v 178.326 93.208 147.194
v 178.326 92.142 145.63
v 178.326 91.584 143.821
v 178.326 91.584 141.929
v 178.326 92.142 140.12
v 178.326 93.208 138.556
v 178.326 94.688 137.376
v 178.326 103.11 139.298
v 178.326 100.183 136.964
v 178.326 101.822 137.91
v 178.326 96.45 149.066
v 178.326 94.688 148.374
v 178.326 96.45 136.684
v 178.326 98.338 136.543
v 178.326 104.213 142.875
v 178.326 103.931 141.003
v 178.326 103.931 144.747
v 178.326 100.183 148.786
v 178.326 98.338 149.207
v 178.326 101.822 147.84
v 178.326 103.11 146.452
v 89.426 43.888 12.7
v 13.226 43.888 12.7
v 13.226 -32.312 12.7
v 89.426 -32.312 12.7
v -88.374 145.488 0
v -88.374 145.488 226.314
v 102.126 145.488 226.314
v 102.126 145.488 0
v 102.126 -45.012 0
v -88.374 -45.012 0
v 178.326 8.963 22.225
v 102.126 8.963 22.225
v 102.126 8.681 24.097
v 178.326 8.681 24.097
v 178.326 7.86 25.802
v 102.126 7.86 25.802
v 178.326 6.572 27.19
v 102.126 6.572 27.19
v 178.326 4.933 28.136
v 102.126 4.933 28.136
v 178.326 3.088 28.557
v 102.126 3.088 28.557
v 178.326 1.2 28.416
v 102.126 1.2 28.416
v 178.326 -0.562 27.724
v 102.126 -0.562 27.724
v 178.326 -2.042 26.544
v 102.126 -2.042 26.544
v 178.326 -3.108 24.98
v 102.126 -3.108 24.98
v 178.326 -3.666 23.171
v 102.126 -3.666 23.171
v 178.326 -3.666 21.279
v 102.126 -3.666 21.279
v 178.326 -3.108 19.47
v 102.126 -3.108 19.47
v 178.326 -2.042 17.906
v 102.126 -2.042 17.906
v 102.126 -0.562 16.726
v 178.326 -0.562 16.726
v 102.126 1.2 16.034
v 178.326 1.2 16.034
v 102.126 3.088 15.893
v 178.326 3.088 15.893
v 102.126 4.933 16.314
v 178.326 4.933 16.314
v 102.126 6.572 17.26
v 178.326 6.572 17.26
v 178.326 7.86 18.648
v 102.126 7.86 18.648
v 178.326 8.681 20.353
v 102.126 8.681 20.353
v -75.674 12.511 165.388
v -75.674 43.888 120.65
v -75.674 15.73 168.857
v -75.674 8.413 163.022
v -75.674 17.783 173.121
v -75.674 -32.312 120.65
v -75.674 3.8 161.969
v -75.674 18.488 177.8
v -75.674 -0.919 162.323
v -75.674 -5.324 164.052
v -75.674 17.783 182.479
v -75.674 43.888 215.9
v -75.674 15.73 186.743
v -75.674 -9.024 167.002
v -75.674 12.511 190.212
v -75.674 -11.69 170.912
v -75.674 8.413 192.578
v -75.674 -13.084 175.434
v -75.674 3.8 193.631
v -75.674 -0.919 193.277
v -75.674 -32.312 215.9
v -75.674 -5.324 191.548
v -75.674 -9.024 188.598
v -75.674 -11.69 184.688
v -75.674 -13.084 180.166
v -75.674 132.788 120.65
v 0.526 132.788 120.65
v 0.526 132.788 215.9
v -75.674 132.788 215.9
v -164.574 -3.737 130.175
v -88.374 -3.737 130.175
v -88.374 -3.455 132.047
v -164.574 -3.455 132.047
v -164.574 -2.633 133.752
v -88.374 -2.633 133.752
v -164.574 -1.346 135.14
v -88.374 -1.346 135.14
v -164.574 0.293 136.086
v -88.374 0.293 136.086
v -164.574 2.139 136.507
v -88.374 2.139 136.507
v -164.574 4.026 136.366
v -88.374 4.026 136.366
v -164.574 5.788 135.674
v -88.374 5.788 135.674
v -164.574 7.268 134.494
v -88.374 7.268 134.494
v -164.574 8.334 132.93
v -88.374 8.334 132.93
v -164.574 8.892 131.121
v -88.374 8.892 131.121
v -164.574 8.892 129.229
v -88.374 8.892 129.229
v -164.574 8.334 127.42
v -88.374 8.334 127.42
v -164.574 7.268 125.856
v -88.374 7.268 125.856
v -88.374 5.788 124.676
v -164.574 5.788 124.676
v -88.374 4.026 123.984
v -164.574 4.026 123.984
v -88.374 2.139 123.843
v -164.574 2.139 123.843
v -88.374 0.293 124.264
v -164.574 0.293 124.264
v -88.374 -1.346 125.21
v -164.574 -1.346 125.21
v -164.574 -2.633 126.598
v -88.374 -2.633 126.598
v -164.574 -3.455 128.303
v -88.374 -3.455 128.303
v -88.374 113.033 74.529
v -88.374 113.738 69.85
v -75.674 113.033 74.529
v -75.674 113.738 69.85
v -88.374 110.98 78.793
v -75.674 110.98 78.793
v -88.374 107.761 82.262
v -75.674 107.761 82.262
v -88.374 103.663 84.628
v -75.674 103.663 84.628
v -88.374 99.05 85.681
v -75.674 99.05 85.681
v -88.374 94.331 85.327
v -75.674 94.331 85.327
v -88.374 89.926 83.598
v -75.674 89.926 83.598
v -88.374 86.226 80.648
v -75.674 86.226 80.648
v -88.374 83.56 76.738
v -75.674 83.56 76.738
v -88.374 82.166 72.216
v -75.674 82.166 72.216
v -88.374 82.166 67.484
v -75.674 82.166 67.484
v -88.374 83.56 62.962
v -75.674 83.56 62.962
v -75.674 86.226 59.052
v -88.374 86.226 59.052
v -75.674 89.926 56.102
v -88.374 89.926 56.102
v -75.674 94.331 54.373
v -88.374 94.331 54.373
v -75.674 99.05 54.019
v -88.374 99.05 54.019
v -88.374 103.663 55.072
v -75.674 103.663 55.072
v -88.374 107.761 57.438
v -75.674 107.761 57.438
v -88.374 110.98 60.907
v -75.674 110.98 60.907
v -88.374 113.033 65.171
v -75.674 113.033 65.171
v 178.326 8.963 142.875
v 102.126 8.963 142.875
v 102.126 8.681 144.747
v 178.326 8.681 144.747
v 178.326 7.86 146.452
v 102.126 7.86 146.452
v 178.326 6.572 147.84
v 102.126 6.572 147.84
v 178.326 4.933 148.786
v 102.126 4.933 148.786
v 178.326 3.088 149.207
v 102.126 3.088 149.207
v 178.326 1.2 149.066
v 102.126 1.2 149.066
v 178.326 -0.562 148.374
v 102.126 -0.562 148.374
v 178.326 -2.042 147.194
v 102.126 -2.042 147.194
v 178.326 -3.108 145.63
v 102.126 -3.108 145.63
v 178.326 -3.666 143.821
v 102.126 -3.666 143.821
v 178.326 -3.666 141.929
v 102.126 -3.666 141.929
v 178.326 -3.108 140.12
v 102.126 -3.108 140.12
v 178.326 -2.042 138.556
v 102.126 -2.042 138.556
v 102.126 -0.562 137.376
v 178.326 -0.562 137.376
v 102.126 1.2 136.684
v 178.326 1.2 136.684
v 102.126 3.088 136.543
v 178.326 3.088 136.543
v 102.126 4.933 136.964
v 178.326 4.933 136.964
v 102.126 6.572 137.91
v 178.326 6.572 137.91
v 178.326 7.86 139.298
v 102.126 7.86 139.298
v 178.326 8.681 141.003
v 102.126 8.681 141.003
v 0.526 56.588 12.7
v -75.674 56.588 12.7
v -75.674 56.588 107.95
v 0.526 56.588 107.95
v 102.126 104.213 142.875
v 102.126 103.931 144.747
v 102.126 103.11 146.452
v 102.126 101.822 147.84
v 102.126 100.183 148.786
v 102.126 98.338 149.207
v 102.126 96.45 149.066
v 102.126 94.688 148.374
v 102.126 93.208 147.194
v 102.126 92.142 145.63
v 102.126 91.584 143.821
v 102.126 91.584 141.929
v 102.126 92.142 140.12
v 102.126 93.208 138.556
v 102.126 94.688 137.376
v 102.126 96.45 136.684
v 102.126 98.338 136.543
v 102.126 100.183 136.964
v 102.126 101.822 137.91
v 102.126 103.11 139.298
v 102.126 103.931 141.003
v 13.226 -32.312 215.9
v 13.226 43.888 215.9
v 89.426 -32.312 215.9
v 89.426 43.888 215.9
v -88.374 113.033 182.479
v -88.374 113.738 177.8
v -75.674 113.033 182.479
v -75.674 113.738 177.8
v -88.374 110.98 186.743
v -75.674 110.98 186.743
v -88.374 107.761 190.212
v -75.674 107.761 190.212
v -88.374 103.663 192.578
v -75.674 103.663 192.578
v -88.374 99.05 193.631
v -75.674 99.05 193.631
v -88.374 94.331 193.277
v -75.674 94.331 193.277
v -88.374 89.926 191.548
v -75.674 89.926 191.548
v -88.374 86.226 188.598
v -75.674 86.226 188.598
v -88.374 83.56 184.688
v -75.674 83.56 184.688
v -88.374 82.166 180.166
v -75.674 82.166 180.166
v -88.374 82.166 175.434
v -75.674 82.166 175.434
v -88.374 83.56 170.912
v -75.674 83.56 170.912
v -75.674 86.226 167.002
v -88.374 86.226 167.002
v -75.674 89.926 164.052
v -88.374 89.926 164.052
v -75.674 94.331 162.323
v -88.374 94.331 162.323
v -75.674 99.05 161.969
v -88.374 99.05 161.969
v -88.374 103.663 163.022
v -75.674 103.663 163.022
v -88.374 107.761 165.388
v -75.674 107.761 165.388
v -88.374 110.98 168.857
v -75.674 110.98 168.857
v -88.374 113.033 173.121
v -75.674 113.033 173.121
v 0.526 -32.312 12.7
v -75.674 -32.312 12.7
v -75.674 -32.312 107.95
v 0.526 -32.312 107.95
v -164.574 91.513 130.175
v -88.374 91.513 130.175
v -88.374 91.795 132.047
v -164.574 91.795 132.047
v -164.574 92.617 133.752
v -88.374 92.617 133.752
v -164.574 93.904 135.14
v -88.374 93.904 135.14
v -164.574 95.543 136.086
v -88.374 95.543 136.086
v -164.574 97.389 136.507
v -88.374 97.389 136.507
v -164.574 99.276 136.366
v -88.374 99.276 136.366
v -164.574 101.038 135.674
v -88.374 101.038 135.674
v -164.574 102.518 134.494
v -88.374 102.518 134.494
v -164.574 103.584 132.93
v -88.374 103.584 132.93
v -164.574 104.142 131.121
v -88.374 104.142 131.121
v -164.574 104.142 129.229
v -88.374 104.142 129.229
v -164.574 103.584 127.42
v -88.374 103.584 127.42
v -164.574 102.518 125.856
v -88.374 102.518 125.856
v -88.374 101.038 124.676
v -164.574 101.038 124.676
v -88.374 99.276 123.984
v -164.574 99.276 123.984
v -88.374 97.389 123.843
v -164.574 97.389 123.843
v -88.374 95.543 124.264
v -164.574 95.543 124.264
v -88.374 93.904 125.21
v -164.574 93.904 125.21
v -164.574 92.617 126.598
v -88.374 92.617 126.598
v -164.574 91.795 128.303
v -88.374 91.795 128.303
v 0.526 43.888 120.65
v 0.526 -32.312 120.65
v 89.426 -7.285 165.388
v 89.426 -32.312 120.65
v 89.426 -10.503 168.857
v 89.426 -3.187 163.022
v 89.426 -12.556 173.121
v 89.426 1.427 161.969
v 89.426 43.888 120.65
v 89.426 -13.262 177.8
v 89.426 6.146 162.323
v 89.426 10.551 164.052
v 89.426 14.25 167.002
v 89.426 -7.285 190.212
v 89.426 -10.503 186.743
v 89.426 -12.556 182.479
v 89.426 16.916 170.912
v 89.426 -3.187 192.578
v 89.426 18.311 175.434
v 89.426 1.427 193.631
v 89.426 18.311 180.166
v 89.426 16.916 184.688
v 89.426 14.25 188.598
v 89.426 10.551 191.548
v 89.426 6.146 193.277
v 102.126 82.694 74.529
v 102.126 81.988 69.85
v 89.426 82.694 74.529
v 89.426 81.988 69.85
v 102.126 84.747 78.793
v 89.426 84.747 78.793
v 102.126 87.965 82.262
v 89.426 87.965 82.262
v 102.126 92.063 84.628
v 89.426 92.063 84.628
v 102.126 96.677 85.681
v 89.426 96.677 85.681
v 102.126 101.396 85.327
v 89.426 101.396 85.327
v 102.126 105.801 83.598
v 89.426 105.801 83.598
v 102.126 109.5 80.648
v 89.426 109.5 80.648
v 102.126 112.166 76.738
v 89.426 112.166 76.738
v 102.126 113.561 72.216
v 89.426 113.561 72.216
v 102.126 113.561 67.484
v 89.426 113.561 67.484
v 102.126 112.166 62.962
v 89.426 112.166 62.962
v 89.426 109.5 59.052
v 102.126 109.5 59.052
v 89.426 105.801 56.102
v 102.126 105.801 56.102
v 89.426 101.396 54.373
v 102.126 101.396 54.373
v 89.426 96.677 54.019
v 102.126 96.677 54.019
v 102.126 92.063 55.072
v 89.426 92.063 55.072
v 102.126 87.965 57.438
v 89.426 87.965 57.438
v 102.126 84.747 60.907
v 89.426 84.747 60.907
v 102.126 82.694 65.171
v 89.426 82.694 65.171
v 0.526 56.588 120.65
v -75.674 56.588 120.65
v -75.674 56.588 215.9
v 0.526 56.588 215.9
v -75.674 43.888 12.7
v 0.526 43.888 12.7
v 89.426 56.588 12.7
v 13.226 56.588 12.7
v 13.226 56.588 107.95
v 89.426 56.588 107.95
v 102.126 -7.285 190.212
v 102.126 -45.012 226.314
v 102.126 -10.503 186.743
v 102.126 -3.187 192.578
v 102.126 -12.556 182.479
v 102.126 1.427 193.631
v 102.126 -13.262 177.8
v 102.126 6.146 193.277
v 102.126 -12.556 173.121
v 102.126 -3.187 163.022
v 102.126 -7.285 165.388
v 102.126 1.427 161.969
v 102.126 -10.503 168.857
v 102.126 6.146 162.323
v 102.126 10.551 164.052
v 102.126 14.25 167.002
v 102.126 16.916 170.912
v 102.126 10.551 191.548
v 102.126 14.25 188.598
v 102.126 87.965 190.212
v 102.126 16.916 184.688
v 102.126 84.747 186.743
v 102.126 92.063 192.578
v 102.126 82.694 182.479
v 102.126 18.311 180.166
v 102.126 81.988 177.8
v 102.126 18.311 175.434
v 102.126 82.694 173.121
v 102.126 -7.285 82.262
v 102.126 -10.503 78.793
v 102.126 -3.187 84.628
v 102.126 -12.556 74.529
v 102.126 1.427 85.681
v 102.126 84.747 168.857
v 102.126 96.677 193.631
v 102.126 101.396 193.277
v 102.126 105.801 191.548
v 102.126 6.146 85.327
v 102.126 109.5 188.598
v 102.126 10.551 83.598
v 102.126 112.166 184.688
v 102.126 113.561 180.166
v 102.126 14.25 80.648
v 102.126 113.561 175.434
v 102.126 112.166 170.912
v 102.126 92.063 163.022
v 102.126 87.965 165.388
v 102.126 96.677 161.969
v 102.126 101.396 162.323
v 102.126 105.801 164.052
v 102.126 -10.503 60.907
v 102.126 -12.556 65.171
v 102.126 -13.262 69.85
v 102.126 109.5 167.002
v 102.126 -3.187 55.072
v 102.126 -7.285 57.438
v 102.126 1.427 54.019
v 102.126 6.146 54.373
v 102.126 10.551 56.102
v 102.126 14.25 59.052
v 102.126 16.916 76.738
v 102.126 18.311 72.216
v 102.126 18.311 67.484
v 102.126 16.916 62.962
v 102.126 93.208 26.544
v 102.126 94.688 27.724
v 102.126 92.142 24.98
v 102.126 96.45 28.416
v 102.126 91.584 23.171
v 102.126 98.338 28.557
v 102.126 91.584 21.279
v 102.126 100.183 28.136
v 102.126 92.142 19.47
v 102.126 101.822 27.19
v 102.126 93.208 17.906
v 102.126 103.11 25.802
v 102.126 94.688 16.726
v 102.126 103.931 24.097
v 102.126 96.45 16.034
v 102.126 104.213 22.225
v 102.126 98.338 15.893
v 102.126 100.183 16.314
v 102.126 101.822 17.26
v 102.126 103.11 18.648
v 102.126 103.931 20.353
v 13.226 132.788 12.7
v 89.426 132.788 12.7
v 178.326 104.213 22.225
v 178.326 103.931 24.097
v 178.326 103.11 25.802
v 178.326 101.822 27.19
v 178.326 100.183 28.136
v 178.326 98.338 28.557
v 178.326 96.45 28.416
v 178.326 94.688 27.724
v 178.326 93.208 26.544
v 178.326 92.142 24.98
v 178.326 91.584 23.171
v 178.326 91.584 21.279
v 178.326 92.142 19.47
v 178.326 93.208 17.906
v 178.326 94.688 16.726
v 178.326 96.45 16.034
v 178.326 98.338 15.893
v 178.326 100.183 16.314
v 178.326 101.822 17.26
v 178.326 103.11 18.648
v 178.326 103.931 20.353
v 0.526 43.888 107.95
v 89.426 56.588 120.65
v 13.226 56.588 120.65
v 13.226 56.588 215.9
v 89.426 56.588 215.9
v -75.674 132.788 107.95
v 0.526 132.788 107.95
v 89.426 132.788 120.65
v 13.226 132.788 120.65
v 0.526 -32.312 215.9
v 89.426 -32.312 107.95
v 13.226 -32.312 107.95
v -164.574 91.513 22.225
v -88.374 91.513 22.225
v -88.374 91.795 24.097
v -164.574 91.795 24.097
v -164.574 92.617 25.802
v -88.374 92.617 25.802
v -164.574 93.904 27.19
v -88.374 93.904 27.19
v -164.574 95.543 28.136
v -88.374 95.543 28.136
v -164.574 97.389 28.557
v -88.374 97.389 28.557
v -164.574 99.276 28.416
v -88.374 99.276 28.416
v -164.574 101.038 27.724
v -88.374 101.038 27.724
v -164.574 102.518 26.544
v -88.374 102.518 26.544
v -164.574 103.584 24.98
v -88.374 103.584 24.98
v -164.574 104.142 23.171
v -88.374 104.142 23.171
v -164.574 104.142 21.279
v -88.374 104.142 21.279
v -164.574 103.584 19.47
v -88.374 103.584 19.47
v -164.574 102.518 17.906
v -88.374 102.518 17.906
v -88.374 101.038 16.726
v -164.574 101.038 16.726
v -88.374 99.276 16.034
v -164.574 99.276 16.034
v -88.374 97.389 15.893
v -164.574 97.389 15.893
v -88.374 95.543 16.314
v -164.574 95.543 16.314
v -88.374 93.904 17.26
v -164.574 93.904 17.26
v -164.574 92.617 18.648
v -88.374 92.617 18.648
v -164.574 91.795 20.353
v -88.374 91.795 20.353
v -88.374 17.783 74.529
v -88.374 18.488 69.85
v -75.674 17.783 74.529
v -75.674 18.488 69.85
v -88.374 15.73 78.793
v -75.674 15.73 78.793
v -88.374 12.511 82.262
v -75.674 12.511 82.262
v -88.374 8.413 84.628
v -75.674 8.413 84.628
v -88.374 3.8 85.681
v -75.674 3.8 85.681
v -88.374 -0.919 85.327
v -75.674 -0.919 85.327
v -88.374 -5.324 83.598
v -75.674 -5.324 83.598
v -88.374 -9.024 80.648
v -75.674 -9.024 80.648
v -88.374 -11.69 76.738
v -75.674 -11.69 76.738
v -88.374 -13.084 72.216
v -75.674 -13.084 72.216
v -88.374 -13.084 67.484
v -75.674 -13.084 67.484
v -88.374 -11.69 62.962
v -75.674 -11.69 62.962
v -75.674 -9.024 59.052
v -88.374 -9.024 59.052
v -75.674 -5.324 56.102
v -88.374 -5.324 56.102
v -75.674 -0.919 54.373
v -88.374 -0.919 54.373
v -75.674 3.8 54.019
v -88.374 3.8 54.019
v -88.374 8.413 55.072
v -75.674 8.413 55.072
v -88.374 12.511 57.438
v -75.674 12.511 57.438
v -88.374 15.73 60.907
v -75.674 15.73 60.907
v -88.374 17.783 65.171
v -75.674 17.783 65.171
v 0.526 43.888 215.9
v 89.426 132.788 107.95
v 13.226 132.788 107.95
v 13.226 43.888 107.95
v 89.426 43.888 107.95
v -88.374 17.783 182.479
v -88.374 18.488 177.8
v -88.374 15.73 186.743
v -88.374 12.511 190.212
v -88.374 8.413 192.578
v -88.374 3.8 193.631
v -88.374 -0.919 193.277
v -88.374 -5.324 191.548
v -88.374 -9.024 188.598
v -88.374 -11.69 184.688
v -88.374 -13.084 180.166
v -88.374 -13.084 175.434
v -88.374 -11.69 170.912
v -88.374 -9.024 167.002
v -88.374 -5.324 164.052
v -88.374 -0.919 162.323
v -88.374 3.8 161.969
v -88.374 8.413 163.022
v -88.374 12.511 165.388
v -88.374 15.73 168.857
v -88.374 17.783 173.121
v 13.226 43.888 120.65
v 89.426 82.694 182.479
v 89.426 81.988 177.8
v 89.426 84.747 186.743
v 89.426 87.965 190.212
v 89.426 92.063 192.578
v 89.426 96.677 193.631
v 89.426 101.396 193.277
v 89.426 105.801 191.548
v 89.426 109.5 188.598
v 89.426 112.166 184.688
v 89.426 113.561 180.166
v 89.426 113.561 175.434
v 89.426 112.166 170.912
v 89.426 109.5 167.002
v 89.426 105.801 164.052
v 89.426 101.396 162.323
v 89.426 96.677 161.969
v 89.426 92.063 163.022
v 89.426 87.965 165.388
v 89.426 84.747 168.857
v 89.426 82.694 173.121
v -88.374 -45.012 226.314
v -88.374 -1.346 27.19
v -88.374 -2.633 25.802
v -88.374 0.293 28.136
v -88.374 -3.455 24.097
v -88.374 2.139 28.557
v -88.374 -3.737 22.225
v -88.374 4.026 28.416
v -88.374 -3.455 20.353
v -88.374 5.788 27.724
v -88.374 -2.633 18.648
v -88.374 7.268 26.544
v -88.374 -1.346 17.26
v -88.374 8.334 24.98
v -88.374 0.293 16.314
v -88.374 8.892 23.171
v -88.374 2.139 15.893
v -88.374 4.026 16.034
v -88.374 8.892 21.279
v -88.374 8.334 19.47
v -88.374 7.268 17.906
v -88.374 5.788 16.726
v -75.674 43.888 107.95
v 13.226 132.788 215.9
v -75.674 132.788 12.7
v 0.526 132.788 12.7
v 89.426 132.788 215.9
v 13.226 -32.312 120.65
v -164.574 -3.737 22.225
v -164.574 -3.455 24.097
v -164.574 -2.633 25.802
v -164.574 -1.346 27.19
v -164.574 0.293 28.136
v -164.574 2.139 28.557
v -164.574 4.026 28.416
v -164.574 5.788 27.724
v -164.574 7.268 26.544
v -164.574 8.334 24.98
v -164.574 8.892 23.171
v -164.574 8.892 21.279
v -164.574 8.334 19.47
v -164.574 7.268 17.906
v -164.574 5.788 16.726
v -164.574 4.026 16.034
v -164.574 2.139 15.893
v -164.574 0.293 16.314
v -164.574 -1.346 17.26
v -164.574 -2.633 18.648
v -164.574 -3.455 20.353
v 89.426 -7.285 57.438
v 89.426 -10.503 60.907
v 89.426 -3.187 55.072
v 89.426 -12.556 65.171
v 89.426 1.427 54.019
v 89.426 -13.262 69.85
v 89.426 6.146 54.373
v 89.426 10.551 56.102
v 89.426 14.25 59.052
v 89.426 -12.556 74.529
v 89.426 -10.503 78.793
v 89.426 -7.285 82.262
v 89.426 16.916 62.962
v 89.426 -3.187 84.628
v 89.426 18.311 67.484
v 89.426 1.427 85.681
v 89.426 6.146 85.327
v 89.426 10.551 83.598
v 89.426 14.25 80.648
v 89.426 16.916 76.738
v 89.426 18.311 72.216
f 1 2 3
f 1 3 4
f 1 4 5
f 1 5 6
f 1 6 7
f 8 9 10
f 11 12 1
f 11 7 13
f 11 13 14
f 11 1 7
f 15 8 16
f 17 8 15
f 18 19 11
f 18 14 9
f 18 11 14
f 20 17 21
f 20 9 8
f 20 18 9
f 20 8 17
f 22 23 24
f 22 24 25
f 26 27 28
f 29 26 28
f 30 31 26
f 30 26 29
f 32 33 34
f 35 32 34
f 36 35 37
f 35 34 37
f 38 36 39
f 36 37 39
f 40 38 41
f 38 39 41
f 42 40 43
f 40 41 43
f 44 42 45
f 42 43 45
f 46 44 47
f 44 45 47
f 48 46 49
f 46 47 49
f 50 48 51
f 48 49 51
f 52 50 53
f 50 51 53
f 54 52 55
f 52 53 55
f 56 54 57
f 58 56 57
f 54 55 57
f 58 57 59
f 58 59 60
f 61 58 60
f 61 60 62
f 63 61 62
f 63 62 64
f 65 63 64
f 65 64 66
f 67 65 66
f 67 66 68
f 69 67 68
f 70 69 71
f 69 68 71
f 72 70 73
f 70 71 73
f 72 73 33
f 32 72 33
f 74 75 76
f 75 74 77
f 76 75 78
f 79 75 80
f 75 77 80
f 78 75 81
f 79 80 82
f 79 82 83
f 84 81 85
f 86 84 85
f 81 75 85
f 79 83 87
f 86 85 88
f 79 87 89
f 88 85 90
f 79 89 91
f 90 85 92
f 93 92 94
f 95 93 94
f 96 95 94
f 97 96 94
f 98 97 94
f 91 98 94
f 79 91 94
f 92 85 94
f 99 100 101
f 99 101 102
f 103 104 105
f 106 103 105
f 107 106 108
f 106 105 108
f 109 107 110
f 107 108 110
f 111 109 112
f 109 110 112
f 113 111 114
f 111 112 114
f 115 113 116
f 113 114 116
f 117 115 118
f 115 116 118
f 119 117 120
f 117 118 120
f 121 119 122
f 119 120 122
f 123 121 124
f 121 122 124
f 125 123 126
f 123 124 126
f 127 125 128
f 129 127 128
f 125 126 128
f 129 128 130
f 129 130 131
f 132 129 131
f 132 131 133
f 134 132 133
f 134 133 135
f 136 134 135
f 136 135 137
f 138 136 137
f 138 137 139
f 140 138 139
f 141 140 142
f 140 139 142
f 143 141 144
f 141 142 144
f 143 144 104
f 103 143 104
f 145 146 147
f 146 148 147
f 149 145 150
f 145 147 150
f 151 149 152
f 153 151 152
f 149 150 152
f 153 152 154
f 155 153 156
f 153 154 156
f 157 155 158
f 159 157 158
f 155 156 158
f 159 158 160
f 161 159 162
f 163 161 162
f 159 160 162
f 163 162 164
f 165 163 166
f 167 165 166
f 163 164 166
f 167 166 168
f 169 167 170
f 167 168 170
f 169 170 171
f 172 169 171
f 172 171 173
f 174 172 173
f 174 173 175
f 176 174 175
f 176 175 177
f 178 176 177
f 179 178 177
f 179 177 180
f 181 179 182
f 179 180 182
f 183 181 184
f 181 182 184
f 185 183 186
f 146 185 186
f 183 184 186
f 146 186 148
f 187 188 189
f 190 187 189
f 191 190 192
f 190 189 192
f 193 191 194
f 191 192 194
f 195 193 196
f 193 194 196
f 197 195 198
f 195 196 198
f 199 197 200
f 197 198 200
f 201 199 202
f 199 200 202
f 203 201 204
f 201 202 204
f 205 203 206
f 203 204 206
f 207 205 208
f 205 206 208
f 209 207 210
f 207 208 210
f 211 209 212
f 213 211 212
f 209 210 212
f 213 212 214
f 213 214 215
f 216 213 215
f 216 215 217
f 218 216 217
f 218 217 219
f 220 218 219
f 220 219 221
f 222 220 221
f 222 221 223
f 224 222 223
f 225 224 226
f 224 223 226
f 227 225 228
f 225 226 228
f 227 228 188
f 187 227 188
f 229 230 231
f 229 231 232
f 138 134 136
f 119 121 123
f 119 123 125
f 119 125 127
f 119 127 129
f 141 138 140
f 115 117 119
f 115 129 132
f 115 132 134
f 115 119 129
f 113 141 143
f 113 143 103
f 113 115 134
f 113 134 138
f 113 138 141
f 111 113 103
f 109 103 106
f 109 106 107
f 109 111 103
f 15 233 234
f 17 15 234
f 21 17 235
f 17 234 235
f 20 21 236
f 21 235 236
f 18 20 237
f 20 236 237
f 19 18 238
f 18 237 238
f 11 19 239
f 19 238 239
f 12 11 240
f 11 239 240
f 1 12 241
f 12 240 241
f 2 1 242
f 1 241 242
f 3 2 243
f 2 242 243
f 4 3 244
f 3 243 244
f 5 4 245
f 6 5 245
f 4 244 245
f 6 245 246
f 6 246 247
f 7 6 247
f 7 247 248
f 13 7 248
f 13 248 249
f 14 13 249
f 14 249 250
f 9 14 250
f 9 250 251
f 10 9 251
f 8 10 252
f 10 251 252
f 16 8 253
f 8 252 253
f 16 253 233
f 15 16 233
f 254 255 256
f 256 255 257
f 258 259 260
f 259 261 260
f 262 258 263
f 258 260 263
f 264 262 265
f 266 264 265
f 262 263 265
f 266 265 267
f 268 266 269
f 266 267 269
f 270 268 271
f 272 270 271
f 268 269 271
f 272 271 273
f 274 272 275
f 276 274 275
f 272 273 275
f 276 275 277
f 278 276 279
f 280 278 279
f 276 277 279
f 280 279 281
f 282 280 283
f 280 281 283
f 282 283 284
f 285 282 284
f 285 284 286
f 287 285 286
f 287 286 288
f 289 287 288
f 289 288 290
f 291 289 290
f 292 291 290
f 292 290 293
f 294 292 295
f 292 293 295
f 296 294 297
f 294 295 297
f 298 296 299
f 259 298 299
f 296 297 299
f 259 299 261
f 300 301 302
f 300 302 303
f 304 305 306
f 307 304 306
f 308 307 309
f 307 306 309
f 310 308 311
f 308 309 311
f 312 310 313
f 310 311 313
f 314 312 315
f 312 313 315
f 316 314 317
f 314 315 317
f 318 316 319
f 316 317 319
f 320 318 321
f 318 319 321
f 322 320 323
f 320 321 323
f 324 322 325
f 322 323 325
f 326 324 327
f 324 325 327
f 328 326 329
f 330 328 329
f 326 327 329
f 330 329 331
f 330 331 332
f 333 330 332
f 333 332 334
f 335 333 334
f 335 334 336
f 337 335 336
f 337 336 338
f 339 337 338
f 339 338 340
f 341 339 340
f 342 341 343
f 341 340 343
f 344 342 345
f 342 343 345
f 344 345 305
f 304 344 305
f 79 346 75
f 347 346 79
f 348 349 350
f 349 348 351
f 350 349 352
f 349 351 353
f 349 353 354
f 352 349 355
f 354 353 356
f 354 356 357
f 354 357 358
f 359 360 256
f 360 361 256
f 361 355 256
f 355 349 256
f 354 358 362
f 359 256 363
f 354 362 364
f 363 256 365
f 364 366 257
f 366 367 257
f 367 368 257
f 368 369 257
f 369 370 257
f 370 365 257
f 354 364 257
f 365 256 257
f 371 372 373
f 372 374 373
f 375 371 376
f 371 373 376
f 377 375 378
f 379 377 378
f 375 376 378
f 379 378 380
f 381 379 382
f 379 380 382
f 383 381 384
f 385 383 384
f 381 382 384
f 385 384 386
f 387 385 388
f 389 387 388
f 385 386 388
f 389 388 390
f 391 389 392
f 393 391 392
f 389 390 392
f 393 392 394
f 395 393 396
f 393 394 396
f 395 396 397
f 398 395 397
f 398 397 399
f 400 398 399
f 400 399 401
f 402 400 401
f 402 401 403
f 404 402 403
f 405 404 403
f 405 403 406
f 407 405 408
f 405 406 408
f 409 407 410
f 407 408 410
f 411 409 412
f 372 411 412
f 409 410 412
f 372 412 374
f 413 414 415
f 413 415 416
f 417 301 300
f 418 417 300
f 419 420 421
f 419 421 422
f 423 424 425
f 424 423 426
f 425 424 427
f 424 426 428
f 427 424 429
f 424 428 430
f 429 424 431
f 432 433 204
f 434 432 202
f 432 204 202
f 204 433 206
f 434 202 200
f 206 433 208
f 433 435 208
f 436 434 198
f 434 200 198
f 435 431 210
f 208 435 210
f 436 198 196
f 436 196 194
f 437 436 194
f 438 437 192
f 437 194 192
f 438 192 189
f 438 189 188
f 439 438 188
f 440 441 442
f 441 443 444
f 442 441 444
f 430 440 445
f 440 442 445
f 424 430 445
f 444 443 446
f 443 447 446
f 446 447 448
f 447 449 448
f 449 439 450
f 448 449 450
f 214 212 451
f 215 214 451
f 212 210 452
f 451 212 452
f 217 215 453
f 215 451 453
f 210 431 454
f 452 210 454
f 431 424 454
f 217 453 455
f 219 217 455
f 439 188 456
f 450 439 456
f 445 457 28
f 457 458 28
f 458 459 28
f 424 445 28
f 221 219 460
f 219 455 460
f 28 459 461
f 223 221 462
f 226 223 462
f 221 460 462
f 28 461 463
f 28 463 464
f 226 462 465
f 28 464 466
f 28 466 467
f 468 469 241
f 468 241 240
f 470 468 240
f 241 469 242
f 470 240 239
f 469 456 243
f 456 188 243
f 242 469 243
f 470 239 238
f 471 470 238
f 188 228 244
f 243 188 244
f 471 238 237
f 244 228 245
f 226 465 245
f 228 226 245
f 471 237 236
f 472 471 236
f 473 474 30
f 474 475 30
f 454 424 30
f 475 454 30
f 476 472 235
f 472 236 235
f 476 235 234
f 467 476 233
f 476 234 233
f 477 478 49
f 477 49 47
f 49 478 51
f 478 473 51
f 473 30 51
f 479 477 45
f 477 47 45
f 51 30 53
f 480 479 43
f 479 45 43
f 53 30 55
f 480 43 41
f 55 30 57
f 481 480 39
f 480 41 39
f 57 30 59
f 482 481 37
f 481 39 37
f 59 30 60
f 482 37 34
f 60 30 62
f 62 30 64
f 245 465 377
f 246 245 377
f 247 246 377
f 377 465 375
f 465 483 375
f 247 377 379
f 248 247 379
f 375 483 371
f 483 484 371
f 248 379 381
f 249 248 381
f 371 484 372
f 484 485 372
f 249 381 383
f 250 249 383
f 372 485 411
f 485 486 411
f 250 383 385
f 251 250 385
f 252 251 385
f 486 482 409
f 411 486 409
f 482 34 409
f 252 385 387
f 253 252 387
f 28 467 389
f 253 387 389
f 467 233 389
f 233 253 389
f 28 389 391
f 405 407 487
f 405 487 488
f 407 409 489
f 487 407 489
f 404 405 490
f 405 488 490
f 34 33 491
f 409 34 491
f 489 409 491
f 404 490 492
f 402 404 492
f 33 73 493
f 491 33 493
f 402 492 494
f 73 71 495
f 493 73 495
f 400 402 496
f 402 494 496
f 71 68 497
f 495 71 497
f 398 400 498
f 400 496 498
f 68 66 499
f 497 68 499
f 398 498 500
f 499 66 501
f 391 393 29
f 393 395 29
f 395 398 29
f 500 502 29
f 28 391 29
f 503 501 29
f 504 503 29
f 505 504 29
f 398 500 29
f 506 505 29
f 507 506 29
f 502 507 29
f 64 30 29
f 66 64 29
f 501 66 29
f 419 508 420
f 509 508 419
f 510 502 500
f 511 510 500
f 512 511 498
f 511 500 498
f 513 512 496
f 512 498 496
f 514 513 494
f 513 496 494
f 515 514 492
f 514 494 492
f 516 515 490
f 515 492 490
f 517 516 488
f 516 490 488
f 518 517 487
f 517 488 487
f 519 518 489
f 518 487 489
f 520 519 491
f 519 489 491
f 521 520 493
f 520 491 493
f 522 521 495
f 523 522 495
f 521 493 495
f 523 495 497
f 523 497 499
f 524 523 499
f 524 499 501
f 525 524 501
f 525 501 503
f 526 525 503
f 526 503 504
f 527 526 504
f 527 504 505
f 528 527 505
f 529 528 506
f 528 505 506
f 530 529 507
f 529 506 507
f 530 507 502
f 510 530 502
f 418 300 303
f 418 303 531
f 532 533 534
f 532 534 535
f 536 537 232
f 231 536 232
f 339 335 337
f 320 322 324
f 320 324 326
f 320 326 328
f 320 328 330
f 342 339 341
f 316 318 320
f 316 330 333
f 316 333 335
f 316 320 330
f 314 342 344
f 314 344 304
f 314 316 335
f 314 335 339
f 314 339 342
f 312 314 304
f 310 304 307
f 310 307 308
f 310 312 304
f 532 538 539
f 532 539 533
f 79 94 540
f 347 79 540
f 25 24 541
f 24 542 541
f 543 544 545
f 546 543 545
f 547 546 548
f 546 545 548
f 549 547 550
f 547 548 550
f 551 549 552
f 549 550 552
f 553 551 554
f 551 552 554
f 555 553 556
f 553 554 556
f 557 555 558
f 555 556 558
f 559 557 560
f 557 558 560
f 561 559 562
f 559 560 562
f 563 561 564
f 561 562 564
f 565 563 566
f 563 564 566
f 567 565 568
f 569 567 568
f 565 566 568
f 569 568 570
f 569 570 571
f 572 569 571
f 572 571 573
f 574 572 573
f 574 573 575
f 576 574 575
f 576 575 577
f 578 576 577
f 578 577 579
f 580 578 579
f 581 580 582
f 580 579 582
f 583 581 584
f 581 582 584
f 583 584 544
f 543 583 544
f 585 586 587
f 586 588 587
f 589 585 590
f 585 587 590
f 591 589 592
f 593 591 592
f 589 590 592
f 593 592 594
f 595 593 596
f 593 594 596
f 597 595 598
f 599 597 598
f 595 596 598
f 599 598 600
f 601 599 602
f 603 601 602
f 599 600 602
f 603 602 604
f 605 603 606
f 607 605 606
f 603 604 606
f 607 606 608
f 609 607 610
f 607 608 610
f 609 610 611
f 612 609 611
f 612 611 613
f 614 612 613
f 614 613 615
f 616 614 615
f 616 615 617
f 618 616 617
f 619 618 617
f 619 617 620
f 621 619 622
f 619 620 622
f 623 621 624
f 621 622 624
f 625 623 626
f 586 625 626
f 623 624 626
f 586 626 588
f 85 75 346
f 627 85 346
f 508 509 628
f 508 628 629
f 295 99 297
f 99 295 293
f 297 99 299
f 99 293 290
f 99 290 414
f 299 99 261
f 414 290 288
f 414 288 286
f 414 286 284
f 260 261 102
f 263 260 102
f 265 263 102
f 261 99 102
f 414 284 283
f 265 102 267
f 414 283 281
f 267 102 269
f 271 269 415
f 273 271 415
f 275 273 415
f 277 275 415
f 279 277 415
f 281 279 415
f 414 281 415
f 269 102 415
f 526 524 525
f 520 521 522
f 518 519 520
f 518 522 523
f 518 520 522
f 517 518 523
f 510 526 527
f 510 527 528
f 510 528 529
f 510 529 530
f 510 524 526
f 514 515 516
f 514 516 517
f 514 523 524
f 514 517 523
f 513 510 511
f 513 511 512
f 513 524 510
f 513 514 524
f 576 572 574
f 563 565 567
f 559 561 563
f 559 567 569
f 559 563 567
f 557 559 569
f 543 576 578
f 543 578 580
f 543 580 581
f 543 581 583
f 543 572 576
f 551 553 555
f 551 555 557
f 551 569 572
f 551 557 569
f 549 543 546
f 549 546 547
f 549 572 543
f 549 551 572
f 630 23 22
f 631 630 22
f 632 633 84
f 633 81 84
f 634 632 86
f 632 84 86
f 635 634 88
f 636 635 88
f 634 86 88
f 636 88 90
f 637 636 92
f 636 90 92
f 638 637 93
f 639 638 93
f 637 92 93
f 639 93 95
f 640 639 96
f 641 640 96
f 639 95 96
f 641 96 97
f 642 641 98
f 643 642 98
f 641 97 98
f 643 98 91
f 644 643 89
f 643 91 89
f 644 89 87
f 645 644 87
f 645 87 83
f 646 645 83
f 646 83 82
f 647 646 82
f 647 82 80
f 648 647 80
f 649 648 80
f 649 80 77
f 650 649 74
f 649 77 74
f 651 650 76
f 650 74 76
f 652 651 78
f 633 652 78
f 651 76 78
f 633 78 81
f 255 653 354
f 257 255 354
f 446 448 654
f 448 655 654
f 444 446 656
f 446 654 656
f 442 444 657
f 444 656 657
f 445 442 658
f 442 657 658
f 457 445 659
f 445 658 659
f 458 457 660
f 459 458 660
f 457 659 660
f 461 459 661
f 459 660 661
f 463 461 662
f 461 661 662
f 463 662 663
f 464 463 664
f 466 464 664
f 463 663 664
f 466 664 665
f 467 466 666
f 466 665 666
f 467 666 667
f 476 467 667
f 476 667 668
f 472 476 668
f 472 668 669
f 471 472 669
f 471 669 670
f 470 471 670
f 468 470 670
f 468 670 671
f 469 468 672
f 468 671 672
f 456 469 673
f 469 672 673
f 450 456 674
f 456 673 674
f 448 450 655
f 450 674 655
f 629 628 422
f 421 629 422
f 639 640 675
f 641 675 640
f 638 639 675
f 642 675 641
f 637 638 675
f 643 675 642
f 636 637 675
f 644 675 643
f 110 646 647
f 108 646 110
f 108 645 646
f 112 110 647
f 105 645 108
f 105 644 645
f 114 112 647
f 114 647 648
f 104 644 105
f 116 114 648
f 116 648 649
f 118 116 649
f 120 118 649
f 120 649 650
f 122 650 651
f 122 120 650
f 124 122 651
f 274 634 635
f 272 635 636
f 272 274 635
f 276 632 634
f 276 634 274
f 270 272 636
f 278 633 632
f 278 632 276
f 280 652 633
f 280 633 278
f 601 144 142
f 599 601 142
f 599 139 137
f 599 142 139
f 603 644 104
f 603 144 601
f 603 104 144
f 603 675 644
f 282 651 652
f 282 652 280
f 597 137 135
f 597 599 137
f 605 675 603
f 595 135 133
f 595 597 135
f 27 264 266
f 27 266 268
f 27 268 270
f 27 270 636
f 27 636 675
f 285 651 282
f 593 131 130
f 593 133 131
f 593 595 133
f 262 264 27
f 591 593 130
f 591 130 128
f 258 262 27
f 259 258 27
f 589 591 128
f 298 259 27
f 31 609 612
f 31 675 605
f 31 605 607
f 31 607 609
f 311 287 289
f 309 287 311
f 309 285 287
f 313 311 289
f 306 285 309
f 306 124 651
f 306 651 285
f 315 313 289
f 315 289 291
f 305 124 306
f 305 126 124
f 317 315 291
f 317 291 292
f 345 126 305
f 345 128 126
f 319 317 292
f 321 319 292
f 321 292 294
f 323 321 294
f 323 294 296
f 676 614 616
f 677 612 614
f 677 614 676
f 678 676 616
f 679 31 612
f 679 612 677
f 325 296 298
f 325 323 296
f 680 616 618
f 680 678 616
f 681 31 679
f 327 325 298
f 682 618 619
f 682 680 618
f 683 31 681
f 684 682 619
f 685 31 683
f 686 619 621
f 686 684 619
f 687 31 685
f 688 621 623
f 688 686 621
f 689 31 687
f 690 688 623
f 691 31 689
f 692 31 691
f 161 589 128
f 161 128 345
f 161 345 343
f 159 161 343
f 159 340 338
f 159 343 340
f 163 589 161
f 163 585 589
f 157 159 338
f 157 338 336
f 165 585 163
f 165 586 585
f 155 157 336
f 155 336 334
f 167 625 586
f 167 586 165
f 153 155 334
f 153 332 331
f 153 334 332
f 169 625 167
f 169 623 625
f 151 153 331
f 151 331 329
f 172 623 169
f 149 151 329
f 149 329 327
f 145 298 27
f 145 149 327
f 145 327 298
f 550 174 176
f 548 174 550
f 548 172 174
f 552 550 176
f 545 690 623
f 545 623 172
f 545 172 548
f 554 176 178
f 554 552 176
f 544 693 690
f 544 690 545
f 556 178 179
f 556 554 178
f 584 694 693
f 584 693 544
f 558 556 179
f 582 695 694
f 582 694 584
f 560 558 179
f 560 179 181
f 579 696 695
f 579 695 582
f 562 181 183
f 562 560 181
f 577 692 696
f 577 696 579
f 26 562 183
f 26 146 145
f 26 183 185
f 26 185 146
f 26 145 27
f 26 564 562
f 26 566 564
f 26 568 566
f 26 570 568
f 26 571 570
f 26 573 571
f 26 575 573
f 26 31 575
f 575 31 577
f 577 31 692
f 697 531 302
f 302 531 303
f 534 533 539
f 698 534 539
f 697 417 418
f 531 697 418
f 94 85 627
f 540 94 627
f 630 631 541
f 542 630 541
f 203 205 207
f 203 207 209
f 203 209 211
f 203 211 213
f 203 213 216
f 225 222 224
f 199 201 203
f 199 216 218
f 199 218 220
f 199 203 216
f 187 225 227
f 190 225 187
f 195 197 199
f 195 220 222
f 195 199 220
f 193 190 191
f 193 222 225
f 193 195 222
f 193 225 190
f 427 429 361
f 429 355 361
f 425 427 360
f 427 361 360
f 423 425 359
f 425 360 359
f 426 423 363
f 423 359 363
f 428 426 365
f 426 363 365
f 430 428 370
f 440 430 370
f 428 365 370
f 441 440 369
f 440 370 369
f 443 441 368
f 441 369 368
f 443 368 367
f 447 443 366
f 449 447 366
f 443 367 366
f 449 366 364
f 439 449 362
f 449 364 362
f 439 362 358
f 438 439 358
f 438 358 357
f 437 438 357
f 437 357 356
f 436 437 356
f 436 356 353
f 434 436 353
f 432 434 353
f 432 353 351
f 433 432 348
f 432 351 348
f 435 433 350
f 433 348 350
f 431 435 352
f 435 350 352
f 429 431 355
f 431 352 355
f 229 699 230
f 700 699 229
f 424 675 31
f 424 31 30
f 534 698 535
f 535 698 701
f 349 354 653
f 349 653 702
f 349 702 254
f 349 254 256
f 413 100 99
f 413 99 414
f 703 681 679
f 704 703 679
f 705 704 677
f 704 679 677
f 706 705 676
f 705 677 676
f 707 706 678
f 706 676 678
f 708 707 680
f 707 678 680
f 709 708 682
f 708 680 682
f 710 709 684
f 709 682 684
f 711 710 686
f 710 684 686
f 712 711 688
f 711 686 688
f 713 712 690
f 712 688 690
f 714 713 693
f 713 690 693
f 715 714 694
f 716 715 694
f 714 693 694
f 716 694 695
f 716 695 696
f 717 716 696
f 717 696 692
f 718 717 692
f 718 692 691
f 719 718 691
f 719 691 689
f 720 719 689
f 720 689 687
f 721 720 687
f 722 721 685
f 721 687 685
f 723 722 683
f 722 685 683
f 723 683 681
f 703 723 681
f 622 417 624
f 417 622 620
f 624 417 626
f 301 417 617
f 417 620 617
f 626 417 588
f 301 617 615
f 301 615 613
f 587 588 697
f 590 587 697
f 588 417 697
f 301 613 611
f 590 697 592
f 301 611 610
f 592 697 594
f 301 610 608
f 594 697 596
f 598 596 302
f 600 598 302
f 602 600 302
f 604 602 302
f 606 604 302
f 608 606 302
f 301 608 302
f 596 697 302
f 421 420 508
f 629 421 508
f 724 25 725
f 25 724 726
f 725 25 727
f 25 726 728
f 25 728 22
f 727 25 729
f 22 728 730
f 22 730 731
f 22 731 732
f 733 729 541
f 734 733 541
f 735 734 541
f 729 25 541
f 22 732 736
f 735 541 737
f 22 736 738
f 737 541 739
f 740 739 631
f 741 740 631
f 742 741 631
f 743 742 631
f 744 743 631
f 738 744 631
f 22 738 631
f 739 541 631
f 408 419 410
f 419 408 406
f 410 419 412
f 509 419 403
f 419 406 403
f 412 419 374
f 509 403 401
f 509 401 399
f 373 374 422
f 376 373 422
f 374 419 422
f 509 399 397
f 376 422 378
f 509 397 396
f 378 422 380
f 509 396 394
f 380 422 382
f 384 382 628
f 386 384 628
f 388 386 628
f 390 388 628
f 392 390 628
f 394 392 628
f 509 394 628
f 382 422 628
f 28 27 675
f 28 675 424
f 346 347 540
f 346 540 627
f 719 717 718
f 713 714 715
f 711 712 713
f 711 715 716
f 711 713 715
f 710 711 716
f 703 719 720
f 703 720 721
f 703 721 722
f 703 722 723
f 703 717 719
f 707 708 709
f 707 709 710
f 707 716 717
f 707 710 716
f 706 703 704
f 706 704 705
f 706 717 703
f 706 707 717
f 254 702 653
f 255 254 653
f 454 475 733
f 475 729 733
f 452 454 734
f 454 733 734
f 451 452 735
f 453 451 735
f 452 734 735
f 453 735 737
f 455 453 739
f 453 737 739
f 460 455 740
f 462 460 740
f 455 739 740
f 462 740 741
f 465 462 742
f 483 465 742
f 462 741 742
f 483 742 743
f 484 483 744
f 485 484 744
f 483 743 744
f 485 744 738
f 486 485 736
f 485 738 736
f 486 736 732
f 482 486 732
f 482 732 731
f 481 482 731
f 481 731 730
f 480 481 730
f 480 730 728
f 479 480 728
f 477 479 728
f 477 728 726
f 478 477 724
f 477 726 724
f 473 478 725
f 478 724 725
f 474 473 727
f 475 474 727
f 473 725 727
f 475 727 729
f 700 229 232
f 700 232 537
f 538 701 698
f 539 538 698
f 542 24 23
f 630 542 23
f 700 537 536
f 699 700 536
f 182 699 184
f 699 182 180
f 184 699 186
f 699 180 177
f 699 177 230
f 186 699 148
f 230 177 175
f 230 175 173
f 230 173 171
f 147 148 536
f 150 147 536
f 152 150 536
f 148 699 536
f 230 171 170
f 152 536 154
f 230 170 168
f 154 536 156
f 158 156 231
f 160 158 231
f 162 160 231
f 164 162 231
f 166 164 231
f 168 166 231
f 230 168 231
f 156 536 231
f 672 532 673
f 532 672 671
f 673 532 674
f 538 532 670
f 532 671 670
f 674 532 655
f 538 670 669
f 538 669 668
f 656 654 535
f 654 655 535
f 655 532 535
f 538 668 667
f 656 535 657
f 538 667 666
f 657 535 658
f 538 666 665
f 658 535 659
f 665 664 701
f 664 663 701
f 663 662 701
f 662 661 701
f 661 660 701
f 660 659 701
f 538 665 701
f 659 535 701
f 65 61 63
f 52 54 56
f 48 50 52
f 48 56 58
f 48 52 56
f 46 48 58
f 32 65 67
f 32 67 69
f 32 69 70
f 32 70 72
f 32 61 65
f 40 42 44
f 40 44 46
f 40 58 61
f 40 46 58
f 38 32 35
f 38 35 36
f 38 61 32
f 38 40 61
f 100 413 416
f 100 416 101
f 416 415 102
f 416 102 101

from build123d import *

# Parameters (mm, degrees)
F0_W      = 177.8
F0_H      = 177.8
F1_DEPTH  = 12.7
F2_W      = 177.8
F2_H      = 203.2
F3_DEPTH  = 12.7
F4_W      = 165.1
F4_H      = 203.2
F5_DEPTH  = 12.7
F6_W      = 165.1
F6_H      = 12.7
F7_DEPTH  = 165.1
F8_W      = 12.7
F8_H      = 76.2
F8_W_2    = 76.2
F8_H_2    = 12.7
F9_DEPTH  = 203.2
F10_W     = 76.2
F10_H     = 95.25
F11_DEPTH = 12.7
F12_W     = 76.2
F12_H     = 95.25
F13_DEPTH = 12.7
F15_D     = 31.75
F15_DEPTH = 12.7
F15_TIP   = 9.5386623271
F17_D     = 31.75
F17_DEPTH = 12.7
F17_TIP   = 9.5386623271
F18_W     = 190.5
F18_H     = 190.5
F19_DEPTH = 10.414
F14_R     = 6.35
F20_DEPTH = 76.2
F16_R     = 6.35
F21_DEPTH = 76.2


with BuildPart() as f1:
    # F0 (on Top) → F1 (new body)
    with BuildSketch(Plane.XY):
        with Locations((13.2262037635, 56.5882699132)):
            Rectangle(F0_W, F0_H)
    extrude(amount=F1_DEPTH)

    # F2 (on face) → F3 (join)
    with BuildSketch(Plane.YZ.offset(102.1262037635)):
        with Locations((56.5882699132, 114.3)):
            Rectangle(F2_W, F2_H)
    extrude(amount=-F3_DEPTH)

    # F4 (on face) → F5 (join)
    with BuildSketch(Plane(origin=(0, 145.4882699132, 0), x_dir=(-1, 0, 0), z_dir=(0, 1, 0))):
        with Locations((-6.8762037635, 114.3)):
            Rectangle(F4_W, F4_H)
    extrude(amount=-F5_DEPTH)

    # F6 (on face) → F7 (join, through all)
    with BuildSketch(Plane(origin=(89.4262037635, 0, 0), x_dir=(0, -1, 0), z_dir=(-1, 0, 0))):
        with Locations((-50.2382699132, 114.3)):
            Rectangle(F6_W, F6_H)
    extrude(amount=F7_DEPTH)

    # F8 (on face) → F9 (join, through all)
    with BuildSketch(Plane.XY.offset(12.7)):
        with Locations((6.8762037635, 94.6882699132)):
            Rectangle(F8_W, F8_H)
        with Locations((-37.5737962365, 50.2382699132)):
            Rectangle(F8_W_2, F8_H_2)
        with Locations((6.8762037635, 50.2382699132)):
            Rectangle(F8_W, F8_H_2)
        with Locations((6.8762037635, 5.7882699132)):
            Rectangle(F8_W, F8_H)
        with Locations((51.3262037635, 50.2382699132)):
            Rectangle(F8_W_2, F8_H_2)
    extrude(amount=F9_DEPTH)

    # F10 (on face) → F11 (join)
    with BuildSketch(Plane(origin=(-75.6737962365, 0, 0), x_dir=(0, -1, 0), z_dir=(-1, 0, 0))):
        Polygon((-132.7882699132, 215.9), (-145.4882699132, 215.9), (-145.4882699132, 0), (32.3117300868, 0), (32.3117300868, 12.7), (-43.8882699132, 12.7), (-43.8882699132, 107.95), (32.3117300868, 107.95), (32.3117300868, 120.65), (-43.8882699132, 120.65), (-43.8882699132, 215.9), (-56.5882699132, 215.9), (-56.5882699132, 120.65), (-132.7882699132, 120.65), align=None)
        with Locations((-94.6882699132, 60.325)):
            Rectangle(F10_W, F10_H, mode=Mode.SUBTRACT)
        with Locations((-94.6882699132, 168.275)):
            Rectangle(F10_W, F10_H)
        with Locations((-5.7882699132, 168.275)):
            Rectangle(F10_W, F10_H)
        with Locations((-5.7882699132, 60.325)):
            Rectangle(F10_W, F10_H)
        with Locations((-94.6882699132, 60.325)):
            Rectangle(F10_W, F10_H)
    extrude(amount=F11_DEPTH)

    # F12 (on face) → F13 (join)
    with BuildSketch(Plane.XZ.offset(32.3117300868)):
        Polygon((-75.6737962365, 215.9), (-88.3737962365, 215.9), (-88.3737962365, 0), (102.1262037635, 0), (102.1262037635, 215.9), (89.4262037635, 215.9), (89.4262037635, 120.65), (13.2262037635, 120.65), (13.2262037635, 215.9), (0.5262037635, 215.9), (0.5262037635, 120.65), (-75.6737962365, 120.65), align=None)
        with Locations((-37.5737962365, 60.325)):
            Rectangle(F12_W, F12_H, mode=Mode.SUBTRACT)
        with Locations((51.3262037635, 60.325)):
            Rectangle(F12_W, F12_H, mode=Mode.SUBTRACT)
        with Locations((-37.5737962365, 168.275)):
            Rectangle(F12_W, F12_H)
        with Locations((51.3262037635, 168.275)):
            Rectangle(F12_W, F12_H)
        with Locations((-37.5737962365, 60.325)):
            Rectangle(F12_W, F12_H)
        with Locations((51.3262037635, 60.325)):
            Rectangle(F12_W, F12_H)
    extrude(amount=F13_DEPTH)

    # F15
    with Locations(Plane.YZ.offset(102.1262037635)):
        with Locations((2.6132699132, 177.8), (97.8632699132, 177.8), (2.6132699132, 69.85), (97.8632699132, 69.85)):
            Hole(F15_D / 2, depth=F15_DEPTH)
            with Locations((0, 0, -(F15_DEPTH + F15_TIP / 2))):  # 118° drill point
                Cone(0, F15_D / 2, F15_TIP, mode=Mode.SUBTRACT)

    # F17
    with Locations(Plane(origin=(-88.3737962365, 0, 0), x_dir=(0, -1, 0), z_dir=(-1, 0, 0))):
        with Locations((-97.8632699132, 177.8), (-2.6132699132, 177.8), (-97.8632699132, 69.85), (-2.6132699132, 69.85)):
            Hole(F17_D / 2, depth=F17_DEPTH)
            with Locations((0, 0, -(F17_DEPTH + F17_TIP / 2))):  # 118° drill point
                Cone(0, F17_D / 2, F17_TIP, mode=Mode.SUBTRACT)

    # F18 (on face) → F19 (join)
    with BuildSketch(Plane.XY.offset(215.9)):
        with Locations((6.8762037635, 50.2382699132)):
            Rectangle(F18_W, F18_H)
    extrude(amount=F19_DEPTH)

    # F14 (on face) → F20 (join)
    with BuildSketch(Plane.YZ.offset(102.1262037635)):
        with Locations((2.6132699132, 142.875)):
            Circle(F14_R)
        with Locations((2.6132699132, 22.225)):
            Circle(F14_R)
        with Locations((97.8632699132, 142.875)):
            Circle(F14_R)
        with Locations((97.8632699132, 22.225)):
            Circle(F14_R)
    extrude(amount=F20_DEPTH)

    # F16 (on face) → F21 (join)
    with BuildSketch(Plane(origin=(-88.3737962365, 0, 0), x_dir=(0, -1, 0), z_dir=(-1, 0, 0))):
        with Locations((-97.8632699132, 130.175)):
            Circle(F16_R)
        with Locations((-97.8632699132, 22.225)):
            Circle(F16_R)
        with Locations((-2.6132699132, 130.175)):
            Circle(F16_R)
        with Locations((-2.6132699132, 22.225)):
            Circle(F16_R)
    extrude(amount=F21_DEPTH)


solid = f1.part
